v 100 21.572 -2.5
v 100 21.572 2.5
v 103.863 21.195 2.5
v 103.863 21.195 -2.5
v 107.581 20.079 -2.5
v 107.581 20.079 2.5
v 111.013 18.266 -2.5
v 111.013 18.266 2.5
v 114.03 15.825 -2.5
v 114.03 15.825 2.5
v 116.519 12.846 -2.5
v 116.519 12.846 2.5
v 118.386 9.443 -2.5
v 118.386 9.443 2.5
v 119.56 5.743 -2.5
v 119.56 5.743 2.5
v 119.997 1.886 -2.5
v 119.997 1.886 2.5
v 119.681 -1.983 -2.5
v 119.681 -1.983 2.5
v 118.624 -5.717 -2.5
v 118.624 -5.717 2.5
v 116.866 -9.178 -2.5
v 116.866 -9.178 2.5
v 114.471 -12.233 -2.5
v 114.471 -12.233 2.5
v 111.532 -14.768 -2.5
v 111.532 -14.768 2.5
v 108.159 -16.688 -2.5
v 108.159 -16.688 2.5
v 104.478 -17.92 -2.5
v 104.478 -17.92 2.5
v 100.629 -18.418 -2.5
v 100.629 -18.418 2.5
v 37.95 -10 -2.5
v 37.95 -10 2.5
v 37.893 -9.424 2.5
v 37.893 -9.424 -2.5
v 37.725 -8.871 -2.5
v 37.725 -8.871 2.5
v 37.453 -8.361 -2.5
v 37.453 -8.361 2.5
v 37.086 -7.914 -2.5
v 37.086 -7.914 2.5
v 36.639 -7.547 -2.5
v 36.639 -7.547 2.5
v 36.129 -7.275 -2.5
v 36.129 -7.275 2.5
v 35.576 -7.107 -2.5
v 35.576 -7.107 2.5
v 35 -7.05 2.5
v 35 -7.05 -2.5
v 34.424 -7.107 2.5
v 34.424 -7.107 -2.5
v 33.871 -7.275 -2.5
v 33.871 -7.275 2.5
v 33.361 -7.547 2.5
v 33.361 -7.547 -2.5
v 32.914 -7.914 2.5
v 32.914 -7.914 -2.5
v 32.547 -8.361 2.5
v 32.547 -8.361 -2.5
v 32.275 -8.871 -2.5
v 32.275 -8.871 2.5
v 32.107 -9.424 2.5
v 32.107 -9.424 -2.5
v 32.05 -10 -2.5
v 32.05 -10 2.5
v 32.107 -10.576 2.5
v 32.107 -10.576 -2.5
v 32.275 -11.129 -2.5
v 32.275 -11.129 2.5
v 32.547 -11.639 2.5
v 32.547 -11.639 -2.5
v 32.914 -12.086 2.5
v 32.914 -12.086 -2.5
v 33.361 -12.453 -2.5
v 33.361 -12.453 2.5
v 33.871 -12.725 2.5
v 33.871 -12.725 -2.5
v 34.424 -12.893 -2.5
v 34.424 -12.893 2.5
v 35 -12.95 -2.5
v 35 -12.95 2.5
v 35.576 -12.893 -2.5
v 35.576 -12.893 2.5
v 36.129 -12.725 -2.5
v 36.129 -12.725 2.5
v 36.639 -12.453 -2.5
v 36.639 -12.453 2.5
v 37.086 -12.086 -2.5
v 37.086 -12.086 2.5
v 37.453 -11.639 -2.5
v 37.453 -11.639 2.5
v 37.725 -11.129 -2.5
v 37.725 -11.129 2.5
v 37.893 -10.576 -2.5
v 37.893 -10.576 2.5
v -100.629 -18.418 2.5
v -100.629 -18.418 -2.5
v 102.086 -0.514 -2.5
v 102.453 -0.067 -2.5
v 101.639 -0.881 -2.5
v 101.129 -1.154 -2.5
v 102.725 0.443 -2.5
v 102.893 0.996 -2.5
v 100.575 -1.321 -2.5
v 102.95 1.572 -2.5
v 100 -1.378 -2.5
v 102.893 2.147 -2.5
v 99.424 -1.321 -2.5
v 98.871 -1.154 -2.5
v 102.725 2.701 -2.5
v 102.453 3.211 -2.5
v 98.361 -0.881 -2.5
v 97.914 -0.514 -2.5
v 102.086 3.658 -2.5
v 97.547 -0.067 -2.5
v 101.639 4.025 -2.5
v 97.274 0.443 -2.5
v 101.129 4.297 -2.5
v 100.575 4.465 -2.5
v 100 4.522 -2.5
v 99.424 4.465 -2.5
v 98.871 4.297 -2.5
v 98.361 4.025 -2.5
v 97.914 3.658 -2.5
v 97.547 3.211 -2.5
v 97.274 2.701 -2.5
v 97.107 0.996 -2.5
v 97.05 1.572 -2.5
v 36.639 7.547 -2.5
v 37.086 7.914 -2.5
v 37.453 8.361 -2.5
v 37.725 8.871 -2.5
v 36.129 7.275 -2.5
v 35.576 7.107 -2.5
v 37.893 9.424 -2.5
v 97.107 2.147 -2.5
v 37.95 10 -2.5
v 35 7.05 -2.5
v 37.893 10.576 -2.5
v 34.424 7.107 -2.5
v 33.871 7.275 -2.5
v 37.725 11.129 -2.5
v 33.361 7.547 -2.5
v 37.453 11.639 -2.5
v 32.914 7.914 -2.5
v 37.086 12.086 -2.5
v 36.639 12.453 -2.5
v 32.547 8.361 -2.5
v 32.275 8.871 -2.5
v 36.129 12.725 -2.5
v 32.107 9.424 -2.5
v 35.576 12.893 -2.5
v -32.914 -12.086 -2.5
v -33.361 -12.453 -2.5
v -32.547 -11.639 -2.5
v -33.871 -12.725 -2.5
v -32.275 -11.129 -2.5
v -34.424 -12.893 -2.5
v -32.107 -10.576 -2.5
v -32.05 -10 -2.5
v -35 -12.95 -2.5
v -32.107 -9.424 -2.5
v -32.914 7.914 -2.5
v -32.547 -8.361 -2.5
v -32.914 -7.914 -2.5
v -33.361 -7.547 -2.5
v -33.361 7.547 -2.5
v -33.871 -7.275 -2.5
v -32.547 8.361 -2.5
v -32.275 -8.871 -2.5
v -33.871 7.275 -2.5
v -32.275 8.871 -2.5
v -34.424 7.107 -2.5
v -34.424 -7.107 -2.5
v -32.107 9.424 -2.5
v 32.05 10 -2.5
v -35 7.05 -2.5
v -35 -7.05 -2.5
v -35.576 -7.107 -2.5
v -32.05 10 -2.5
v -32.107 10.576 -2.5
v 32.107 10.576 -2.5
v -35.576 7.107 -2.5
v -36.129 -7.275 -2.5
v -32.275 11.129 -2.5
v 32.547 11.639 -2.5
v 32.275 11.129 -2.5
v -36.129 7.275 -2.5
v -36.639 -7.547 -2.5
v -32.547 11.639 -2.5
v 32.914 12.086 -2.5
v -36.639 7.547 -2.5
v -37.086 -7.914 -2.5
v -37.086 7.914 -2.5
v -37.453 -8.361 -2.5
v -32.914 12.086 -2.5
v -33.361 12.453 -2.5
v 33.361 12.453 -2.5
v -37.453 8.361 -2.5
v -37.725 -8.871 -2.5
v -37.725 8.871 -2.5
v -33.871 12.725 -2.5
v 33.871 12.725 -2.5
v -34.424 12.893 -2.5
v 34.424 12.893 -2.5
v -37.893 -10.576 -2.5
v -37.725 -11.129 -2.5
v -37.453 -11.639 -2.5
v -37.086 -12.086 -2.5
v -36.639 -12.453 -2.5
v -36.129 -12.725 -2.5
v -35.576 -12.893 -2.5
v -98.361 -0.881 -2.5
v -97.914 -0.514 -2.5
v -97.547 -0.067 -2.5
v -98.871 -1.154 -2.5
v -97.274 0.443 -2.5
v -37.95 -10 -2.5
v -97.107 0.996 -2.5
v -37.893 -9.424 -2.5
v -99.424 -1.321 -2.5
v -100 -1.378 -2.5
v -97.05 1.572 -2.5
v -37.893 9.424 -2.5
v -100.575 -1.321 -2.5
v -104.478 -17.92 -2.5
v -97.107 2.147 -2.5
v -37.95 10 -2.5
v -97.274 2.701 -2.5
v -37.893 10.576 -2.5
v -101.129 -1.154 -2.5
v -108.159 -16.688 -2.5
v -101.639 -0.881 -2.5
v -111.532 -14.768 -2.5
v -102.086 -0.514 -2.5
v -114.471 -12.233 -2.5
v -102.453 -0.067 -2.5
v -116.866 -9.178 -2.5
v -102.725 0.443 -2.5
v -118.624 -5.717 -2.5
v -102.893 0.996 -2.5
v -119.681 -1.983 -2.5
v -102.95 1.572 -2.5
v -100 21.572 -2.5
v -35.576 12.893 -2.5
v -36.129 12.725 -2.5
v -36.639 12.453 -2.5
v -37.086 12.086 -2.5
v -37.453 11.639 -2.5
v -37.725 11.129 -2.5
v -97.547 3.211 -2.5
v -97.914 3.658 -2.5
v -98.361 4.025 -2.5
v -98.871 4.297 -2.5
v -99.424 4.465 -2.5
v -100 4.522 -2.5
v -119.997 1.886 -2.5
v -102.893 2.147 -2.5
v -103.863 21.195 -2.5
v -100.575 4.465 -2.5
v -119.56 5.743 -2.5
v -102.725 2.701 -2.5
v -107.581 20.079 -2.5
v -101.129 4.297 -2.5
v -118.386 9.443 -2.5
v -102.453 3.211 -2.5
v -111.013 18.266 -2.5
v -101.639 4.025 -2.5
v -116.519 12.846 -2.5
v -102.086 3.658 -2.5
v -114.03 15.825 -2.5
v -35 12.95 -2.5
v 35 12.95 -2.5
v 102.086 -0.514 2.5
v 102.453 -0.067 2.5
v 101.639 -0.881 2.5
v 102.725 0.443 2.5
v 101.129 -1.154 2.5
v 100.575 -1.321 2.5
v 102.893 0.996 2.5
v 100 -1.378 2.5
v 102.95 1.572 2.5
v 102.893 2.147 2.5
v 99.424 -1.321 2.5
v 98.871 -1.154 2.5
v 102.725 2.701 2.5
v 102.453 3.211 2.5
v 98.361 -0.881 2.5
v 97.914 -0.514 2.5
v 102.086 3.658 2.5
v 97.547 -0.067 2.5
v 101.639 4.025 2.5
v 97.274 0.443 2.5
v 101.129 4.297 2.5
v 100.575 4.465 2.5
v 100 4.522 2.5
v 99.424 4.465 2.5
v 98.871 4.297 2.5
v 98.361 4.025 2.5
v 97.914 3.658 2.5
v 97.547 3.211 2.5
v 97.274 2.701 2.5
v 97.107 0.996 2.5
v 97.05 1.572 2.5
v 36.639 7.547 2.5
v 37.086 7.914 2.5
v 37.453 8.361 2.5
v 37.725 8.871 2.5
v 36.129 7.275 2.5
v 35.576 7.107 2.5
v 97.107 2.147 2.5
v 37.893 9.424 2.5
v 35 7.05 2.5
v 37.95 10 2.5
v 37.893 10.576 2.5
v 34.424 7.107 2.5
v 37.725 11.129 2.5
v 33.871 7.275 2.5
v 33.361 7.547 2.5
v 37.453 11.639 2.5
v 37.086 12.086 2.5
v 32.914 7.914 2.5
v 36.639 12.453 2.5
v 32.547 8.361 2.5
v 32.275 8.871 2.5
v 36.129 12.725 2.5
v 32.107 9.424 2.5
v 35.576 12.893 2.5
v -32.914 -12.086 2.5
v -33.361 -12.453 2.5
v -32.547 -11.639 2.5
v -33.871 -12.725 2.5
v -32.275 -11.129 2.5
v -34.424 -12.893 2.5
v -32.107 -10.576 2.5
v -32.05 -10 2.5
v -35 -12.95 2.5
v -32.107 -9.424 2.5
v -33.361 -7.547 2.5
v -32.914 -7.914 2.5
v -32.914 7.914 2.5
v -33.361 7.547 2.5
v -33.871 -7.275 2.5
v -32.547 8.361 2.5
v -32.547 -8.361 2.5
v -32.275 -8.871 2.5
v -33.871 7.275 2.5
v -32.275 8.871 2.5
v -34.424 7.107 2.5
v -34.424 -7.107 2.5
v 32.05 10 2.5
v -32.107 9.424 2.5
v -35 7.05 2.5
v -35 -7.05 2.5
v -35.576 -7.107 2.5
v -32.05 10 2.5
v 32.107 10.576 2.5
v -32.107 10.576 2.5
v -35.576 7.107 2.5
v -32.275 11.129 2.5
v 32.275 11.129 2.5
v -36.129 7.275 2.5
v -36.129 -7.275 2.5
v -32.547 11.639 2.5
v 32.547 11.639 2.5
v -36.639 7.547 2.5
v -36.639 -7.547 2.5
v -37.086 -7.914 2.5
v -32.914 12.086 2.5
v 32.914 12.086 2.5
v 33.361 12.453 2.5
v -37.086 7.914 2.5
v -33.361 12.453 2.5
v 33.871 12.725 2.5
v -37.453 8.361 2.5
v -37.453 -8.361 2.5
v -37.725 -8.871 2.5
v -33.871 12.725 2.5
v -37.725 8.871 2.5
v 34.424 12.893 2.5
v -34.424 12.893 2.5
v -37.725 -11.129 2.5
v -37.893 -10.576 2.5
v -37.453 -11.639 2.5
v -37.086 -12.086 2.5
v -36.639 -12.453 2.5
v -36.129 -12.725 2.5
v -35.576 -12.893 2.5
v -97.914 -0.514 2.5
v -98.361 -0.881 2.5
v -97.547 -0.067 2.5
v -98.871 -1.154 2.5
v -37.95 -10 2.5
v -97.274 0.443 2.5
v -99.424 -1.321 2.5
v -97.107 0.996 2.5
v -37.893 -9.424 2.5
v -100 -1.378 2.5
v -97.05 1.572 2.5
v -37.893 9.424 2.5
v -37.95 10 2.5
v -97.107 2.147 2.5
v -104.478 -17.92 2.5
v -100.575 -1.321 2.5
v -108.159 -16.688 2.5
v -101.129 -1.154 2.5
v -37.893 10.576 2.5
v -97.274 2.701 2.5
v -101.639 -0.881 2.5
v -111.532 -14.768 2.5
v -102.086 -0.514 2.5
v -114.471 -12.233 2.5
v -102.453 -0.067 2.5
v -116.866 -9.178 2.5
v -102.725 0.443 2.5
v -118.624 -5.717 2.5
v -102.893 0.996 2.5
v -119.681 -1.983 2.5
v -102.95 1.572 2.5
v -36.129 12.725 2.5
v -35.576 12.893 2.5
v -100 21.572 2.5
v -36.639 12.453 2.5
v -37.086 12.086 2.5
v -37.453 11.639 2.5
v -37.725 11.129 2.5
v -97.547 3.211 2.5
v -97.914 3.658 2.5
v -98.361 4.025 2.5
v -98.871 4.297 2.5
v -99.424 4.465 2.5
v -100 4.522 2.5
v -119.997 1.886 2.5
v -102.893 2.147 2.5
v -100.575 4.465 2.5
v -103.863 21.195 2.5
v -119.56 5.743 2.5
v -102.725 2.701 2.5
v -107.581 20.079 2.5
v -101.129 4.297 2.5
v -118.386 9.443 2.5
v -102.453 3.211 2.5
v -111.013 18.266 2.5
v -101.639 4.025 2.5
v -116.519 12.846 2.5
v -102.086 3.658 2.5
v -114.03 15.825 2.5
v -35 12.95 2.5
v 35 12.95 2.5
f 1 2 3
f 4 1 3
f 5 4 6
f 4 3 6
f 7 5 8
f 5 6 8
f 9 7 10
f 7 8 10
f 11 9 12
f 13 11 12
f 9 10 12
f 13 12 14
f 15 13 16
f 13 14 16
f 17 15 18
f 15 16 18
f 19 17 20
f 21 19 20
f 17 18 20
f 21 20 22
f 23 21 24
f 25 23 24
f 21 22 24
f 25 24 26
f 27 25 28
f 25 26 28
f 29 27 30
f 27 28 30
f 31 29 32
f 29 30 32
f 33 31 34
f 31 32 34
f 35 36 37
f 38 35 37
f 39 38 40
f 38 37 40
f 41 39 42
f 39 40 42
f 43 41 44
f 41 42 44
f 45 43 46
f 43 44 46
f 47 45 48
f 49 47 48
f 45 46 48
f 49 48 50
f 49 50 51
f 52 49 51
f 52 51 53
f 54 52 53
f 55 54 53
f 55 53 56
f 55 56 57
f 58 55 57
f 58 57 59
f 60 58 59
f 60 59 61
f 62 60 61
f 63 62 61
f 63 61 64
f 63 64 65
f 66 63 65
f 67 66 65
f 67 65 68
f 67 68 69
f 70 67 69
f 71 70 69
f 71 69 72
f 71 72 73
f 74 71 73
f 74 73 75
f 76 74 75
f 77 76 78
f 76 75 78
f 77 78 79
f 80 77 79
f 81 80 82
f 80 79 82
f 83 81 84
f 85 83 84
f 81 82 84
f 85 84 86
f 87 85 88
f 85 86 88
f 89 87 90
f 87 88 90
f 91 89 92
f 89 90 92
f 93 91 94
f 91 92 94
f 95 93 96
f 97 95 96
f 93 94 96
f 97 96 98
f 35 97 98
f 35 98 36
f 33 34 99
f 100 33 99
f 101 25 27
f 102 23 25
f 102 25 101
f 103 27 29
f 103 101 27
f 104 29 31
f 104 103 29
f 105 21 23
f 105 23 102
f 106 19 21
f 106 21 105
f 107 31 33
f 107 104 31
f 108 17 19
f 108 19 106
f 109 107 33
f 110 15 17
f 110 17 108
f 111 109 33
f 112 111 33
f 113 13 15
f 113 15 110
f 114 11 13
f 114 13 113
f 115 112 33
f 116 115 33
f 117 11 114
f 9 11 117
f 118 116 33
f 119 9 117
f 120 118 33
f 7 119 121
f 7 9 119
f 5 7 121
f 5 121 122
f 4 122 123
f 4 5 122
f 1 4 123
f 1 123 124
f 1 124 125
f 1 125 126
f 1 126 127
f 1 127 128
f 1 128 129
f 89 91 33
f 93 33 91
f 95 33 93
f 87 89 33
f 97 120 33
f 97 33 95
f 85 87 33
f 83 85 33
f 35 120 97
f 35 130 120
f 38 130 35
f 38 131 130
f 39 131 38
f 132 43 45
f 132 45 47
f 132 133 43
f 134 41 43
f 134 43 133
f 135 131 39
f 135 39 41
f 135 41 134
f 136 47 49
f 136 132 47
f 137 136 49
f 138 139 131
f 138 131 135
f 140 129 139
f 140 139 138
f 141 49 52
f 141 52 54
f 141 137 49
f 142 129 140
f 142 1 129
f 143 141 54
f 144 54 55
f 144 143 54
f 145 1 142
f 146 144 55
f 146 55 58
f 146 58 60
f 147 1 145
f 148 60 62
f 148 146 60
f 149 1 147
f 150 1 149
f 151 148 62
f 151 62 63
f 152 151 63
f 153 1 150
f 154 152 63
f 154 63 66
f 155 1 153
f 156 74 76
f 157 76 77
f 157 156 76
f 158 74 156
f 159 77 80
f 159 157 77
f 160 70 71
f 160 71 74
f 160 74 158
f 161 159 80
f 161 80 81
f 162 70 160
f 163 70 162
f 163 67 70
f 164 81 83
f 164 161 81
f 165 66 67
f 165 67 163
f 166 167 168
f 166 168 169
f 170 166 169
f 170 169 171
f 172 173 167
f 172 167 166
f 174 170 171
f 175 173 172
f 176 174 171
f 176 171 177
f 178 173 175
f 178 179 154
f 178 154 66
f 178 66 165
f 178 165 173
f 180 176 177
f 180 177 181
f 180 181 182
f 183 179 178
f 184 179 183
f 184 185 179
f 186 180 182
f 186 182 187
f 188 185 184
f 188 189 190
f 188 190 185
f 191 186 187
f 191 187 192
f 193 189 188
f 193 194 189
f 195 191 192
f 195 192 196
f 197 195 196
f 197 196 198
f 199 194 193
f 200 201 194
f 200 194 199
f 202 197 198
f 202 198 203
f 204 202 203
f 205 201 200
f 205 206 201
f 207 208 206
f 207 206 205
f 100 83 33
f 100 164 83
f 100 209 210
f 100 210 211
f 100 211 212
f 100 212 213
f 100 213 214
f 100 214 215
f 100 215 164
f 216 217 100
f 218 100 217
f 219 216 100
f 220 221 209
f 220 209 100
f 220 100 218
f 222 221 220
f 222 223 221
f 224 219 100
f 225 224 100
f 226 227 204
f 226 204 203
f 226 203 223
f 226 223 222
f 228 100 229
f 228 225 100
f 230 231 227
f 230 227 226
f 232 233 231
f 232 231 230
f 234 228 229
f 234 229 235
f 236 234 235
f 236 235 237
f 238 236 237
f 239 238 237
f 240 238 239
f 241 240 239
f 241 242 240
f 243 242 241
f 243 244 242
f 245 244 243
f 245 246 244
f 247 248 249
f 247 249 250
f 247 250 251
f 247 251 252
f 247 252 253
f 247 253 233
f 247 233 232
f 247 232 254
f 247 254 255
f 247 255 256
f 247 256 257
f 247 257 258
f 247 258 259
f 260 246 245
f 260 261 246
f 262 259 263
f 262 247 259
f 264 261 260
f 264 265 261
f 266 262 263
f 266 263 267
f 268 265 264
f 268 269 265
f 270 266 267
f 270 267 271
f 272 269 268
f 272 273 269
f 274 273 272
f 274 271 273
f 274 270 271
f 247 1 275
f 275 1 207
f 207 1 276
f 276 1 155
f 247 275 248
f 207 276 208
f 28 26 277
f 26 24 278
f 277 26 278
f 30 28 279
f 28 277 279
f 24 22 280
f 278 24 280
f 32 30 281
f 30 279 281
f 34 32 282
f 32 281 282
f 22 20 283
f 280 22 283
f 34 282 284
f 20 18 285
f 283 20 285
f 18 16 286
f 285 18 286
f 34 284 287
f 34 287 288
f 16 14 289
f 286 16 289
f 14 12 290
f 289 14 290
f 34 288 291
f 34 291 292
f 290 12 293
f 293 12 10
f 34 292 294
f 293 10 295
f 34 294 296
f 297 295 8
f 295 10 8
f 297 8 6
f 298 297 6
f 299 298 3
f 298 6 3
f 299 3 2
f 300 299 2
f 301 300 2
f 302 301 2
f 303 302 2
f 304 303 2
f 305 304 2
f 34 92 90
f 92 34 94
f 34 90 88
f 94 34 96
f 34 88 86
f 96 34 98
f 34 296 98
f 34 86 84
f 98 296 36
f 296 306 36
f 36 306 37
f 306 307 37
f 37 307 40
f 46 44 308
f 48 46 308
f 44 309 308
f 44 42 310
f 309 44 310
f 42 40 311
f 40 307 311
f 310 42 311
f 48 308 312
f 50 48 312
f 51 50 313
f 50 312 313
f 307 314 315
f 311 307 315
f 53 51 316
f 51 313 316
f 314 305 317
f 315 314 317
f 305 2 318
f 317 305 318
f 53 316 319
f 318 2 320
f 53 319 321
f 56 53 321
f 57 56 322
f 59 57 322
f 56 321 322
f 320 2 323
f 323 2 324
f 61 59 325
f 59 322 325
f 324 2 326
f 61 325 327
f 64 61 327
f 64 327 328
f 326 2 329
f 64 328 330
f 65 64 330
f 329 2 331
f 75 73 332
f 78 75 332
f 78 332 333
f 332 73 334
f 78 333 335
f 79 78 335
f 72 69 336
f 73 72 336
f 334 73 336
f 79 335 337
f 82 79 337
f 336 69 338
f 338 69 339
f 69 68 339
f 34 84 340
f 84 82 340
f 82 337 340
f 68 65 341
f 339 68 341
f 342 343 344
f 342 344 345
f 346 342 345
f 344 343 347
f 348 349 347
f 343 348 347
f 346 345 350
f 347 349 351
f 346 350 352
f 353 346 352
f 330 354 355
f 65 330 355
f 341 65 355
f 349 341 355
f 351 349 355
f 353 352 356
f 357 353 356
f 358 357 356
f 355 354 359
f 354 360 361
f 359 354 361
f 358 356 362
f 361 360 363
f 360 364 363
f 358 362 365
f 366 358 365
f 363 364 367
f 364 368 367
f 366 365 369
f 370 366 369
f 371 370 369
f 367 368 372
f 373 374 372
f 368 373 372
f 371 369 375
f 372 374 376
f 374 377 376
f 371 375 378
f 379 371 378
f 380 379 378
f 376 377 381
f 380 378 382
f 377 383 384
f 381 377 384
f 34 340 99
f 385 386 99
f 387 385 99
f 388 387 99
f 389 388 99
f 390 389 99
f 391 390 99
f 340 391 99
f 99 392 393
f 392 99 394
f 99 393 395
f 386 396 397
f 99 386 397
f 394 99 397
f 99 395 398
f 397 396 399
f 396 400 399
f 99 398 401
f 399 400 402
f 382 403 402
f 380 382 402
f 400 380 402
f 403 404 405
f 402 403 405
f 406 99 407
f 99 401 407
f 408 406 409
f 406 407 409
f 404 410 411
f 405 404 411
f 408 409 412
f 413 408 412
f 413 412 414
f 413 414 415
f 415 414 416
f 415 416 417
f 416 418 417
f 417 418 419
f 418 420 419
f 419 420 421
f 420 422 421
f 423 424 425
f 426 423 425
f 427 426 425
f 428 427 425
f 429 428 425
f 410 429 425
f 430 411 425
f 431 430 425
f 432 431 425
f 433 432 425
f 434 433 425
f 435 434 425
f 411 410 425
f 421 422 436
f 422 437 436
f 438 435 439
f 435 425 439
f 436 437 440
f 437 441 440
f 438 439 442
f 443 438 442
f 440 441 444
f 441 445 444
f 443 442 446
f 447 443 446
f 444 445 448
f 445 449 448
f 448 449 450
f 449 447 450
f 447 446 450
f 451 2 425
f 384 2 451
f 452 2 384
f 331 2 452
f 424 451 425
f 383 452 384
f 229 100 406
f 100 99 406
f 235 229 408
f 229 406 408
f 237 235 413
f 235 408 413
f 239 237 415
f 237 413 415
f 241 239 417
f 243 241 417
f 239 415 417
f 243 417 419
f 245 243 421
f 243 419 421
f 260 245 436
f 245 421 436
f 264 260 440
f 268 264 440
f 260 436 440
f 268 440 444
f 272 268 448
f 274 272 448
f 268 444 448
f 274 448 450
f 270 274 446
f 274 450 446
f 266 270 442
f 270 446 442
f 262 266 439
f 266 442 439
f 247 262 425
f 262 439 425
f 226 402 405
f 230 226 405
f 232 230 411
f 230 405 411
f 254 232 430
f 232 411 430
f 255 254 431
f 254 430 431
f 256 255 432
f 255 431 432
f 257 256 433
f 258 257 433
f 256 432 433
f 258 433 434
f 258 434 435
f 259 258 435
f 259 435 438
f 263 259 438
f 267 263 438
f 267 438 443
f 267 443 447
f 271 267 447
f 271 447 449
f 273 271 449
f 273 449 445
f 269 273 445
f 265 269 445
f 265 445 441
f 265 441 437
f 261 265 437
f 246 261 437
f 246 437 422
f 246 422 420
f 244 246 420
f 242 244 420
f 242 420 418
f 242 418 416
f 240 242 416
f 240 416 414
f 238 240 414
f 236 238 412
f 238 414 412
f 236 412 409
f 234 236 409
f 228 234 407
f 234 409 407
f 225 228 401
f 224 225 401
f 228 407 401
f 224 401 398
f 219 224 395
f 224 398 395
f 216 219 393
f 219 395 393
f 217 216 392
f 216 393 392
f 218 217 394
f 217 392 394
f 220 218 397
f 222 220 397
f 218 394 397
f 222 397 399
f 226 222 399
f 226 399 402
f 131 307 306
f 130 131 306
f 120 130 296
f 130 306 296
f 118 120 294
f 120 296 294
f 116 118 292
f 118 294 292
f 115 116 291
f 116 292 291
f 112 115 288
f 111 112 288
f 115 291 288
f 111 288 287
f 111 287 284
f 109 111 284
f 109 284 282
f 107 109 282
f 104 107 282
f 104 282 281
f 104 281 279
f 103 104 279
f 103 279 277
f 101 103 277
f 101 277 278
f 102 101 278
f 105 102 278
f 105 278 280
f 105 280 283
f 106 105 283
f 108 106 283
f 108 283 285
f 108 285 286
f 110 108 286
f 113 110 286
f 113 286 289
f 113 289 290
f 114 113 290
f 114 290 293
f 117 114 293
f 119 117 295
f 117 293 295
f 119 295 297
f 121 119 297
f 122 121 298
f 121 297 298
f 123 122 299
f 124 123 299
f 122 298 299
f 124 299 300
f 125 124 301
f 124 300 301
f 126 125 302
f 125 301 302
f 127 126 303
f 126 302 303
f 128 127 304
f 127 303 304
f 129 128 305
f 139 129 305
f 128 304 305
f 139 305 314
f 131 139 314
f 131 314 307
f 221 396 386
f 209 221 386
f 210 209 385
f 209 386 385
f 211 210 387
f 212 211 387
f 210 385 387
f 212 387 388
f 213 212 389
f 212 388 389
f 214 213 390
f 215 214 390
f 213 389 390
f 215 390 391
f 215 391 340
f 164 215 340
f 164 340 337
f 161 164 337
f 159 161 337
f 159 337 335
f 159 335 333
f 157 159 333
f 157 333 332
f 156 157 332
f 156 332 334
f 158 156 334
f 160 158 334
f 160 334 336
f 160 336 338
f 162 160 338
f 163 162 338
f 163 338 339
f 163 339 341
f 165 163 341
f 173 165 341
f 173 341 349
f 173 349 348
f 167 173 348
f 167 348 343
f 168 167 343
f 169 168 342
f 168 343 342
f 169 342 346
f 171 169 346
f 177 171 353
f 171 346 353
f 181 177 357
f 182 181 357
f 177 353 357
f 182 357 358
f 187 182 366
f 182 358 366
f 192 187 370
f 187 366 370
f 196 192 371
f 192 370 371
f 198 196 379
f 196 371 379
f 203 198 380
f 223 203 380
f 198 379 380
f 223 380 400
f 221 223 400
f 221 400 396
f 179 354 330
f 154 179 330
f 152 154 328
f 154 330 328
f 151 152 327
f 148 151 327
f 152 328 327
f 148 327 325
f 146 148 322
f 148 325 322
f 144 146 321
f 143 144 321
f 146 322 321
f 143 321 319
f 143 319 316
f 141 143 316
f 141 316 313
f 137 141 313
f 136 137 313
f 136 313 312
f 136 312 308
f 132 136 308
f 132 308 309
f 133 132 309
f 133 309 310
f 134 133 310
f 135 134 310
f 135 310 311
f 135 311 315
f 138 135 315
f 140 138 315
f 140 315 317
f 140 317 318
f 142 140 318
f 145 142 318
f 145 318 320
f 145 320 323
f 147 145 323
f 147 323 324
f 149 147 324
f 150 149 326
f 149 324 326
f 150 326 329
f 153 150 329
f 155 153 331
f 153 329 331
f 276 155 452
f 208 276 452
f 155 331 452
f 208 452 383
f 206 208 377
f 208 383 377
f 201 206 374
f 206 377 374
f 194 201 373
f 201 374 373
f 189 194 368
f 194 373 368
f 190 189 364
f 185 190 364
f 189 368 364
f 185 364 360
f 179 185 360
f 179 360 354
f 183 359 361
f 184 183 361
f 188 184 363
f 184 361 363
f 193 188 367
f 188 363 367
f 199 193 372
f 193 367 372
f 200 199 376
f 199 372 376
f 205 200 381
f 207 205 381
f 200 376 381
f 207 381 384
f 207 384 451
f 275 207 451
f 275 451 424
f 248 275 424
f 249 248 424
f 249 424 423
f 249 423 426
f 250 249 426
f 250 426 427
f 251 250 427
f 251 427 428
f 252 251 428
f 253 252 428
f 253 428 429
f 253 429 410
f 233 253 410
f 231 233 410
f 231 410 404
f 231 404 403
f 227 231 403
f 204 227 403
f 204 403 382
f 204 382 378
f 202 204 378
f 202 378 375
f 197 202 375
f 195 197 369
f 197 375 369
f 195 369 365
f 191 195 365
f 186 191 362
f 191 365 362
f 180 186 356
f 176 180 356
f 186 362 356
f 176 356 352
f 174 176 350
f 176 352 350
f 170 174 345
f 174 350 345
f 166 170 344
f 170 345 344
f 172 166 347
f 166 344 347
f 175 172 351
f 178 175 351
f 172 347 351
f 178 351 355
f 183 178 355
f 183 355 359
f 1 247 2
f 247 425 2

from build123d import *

# Parameters (mm, degrees)
EXTRUIR1_DEPTH        = 2.5
CROQUIS3_R            = 2.95
CORTAR_EXTRUIR1_DEPTH = 10
CROQUIS4_R            = 2.95
CORTAR_EXTRUIR2_DEPTH = 10


with BuildPart() as part:
    # Croquis2 → Extruir1 (new, symmetric)
    with BuildSketch(Plane.XY):
        with BuildLine():
            Line((100.628572724, -18.418297608), (-100.628572724, -18.418297608))
            ThreePointArc((-100.628572724, -18.418297608), (-119.997393731, 1.886143297), (-100, 21.57181808))
            Line((-100, 21.57181808), (100, 21.57181808))
            ThreePointArc((100, 21.57181808), (119.997393731, 1.886143297), (100.628572724, -18.418297608))
        make_face()
    extrude(amount=EXTRUIR1_DEPTH, both=True)

    # Croquis3 → Cortar-Extruir1 (cut)
    with BuildSketch(Plane.XY.offset(2.5)):
        with Locations(Location((99.999863892, 1.57181808, 0), (0, 0, 180))):
            Circle(CROQUIS3_R)
        with Locations((-99.999863892, 1.57181808)):
            Circle(CROQUIS3_R)
    extrude(amount=-CORTAR_EXTRUIR1_DEPTH, mode=Mode.SUBTRACT)

    # Croquis4 → Cortar-Extruir2 (cut)
    with BuildSketch(Plane.XY.offset(2.5)):
        with Locations((-35, 10)):
            Circle(CROQUIS4_R)
        with Locations(Location((-35, -10, 0), (0, 0, 180))):
            Circle(CROQUIS4_R)
        with Locations((35, -10)):
            Circle(CROQUIS4_R)
        with Locations(Location((35, 10, 0), (0, 0, 180))):
            Circle(CROQUIS4_R)
    extrude(amount=-CORTAR_EXTRUIR2_DEPTH, mode=Mode.SUBTRACT)


solid = part.part
